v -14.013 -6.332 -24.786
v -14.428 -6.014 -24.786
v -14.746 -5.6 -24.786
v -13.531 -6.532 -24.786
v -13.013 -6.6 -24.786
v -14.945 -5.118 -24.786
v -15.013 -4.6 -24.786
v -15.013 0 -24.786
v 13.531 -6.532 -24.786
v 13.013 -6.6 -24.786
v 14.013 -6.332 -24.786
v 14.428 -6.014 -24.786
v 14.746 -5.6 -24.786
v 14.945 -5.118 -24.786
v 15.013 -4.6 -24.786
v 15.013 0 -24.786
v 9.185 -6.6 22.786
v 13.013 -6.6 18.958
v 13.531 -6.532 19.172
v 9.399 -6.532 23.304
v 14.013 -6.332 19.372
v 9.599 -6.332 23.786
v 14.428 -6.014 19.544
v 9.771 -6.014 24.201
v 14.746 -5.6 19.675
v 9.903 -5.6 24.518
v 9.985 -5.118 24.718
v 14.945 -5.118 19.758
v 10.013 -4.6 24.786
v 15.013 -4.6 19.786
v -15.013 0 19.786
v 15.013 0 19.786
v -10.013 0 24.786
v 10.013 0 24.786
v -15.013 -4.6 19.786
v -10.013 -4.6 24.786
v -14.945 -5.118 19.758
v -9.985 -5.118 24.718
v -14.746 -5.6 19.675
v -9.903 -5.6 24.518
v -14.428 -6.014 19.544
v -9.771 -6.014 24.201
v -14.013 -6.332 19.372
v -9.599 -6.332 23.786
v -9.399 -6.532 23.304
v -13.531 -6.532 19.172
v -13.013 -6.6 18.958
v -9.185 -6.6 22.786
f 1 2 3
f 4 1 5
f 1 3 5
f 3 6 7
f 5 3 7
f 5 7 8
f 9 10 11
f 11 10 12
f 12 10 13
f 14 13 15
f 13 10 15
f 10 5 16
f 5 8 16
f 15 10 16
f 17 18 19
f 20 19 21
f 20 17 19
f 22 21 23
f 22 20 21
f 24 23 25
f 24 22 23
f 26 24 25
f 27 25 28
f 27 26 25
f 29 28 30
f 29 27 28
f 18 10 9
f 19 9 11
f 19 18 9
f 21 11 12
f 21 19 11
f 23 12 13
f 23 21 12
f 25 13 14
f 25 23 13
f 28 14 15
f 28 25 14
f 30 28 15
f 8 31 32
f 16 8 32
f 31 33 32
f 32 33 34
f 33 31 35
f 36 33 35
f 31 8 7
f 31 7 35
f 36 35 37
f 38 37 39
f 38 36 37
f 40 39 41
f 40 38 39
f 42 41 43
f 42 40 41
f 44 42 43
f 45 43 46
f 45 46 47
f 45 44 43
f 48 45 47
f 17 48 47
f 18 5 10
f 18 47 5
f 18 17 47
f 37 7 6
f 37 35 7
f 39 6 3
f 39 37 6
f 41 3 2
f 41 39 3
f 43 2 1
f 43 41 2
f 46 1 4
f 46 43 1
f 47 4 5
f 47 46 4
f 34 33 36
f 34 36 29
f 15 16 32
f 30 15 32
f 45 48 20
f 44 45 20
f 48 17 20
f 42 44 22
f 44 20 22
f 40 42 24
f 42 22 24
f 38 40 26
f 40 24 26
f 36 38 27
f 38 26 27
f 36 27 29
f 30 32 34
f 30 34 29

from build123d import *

# Parameters (mm, degrees)
F0_W     = 30.0269816071
F0_H     = 49.5728440583
F1_DEPTH = 6.6
F2_SIZE  = 5
F3_R     = 2


with BuildPart() as f1:
    # F0 (on Front) → F1 (new body)
    with BuildSketch(Plane.XZ):
        Rectangle(F0_W, F0_H)
    extrude(amount=F1_DEPTH)

    # F2
    f2_edges = [f1.edges().sort_by_distance(p)[0] for p in [
        (-15.013491, -3.3, 24.786422),
        (15.013491, -3.3, 24.786422),
    ]]
    chamfer(f2_edges, length=F2_SIZE)

    # F3
    f3_edges = [f1.edges().sort_by_distance(p)[0] for p in [
        (12.513491, -6.6, 22.286422),
        (-15.013491, -6.6, -2.5),
        (0, -6.6, 24.786422),
        (15.013491, -6.6, -2.5),
        (-12.513491, -6.6, 22.286422),
    ]]
    fillet(f3_edges, radius=F3_R)


solid = f1.part
